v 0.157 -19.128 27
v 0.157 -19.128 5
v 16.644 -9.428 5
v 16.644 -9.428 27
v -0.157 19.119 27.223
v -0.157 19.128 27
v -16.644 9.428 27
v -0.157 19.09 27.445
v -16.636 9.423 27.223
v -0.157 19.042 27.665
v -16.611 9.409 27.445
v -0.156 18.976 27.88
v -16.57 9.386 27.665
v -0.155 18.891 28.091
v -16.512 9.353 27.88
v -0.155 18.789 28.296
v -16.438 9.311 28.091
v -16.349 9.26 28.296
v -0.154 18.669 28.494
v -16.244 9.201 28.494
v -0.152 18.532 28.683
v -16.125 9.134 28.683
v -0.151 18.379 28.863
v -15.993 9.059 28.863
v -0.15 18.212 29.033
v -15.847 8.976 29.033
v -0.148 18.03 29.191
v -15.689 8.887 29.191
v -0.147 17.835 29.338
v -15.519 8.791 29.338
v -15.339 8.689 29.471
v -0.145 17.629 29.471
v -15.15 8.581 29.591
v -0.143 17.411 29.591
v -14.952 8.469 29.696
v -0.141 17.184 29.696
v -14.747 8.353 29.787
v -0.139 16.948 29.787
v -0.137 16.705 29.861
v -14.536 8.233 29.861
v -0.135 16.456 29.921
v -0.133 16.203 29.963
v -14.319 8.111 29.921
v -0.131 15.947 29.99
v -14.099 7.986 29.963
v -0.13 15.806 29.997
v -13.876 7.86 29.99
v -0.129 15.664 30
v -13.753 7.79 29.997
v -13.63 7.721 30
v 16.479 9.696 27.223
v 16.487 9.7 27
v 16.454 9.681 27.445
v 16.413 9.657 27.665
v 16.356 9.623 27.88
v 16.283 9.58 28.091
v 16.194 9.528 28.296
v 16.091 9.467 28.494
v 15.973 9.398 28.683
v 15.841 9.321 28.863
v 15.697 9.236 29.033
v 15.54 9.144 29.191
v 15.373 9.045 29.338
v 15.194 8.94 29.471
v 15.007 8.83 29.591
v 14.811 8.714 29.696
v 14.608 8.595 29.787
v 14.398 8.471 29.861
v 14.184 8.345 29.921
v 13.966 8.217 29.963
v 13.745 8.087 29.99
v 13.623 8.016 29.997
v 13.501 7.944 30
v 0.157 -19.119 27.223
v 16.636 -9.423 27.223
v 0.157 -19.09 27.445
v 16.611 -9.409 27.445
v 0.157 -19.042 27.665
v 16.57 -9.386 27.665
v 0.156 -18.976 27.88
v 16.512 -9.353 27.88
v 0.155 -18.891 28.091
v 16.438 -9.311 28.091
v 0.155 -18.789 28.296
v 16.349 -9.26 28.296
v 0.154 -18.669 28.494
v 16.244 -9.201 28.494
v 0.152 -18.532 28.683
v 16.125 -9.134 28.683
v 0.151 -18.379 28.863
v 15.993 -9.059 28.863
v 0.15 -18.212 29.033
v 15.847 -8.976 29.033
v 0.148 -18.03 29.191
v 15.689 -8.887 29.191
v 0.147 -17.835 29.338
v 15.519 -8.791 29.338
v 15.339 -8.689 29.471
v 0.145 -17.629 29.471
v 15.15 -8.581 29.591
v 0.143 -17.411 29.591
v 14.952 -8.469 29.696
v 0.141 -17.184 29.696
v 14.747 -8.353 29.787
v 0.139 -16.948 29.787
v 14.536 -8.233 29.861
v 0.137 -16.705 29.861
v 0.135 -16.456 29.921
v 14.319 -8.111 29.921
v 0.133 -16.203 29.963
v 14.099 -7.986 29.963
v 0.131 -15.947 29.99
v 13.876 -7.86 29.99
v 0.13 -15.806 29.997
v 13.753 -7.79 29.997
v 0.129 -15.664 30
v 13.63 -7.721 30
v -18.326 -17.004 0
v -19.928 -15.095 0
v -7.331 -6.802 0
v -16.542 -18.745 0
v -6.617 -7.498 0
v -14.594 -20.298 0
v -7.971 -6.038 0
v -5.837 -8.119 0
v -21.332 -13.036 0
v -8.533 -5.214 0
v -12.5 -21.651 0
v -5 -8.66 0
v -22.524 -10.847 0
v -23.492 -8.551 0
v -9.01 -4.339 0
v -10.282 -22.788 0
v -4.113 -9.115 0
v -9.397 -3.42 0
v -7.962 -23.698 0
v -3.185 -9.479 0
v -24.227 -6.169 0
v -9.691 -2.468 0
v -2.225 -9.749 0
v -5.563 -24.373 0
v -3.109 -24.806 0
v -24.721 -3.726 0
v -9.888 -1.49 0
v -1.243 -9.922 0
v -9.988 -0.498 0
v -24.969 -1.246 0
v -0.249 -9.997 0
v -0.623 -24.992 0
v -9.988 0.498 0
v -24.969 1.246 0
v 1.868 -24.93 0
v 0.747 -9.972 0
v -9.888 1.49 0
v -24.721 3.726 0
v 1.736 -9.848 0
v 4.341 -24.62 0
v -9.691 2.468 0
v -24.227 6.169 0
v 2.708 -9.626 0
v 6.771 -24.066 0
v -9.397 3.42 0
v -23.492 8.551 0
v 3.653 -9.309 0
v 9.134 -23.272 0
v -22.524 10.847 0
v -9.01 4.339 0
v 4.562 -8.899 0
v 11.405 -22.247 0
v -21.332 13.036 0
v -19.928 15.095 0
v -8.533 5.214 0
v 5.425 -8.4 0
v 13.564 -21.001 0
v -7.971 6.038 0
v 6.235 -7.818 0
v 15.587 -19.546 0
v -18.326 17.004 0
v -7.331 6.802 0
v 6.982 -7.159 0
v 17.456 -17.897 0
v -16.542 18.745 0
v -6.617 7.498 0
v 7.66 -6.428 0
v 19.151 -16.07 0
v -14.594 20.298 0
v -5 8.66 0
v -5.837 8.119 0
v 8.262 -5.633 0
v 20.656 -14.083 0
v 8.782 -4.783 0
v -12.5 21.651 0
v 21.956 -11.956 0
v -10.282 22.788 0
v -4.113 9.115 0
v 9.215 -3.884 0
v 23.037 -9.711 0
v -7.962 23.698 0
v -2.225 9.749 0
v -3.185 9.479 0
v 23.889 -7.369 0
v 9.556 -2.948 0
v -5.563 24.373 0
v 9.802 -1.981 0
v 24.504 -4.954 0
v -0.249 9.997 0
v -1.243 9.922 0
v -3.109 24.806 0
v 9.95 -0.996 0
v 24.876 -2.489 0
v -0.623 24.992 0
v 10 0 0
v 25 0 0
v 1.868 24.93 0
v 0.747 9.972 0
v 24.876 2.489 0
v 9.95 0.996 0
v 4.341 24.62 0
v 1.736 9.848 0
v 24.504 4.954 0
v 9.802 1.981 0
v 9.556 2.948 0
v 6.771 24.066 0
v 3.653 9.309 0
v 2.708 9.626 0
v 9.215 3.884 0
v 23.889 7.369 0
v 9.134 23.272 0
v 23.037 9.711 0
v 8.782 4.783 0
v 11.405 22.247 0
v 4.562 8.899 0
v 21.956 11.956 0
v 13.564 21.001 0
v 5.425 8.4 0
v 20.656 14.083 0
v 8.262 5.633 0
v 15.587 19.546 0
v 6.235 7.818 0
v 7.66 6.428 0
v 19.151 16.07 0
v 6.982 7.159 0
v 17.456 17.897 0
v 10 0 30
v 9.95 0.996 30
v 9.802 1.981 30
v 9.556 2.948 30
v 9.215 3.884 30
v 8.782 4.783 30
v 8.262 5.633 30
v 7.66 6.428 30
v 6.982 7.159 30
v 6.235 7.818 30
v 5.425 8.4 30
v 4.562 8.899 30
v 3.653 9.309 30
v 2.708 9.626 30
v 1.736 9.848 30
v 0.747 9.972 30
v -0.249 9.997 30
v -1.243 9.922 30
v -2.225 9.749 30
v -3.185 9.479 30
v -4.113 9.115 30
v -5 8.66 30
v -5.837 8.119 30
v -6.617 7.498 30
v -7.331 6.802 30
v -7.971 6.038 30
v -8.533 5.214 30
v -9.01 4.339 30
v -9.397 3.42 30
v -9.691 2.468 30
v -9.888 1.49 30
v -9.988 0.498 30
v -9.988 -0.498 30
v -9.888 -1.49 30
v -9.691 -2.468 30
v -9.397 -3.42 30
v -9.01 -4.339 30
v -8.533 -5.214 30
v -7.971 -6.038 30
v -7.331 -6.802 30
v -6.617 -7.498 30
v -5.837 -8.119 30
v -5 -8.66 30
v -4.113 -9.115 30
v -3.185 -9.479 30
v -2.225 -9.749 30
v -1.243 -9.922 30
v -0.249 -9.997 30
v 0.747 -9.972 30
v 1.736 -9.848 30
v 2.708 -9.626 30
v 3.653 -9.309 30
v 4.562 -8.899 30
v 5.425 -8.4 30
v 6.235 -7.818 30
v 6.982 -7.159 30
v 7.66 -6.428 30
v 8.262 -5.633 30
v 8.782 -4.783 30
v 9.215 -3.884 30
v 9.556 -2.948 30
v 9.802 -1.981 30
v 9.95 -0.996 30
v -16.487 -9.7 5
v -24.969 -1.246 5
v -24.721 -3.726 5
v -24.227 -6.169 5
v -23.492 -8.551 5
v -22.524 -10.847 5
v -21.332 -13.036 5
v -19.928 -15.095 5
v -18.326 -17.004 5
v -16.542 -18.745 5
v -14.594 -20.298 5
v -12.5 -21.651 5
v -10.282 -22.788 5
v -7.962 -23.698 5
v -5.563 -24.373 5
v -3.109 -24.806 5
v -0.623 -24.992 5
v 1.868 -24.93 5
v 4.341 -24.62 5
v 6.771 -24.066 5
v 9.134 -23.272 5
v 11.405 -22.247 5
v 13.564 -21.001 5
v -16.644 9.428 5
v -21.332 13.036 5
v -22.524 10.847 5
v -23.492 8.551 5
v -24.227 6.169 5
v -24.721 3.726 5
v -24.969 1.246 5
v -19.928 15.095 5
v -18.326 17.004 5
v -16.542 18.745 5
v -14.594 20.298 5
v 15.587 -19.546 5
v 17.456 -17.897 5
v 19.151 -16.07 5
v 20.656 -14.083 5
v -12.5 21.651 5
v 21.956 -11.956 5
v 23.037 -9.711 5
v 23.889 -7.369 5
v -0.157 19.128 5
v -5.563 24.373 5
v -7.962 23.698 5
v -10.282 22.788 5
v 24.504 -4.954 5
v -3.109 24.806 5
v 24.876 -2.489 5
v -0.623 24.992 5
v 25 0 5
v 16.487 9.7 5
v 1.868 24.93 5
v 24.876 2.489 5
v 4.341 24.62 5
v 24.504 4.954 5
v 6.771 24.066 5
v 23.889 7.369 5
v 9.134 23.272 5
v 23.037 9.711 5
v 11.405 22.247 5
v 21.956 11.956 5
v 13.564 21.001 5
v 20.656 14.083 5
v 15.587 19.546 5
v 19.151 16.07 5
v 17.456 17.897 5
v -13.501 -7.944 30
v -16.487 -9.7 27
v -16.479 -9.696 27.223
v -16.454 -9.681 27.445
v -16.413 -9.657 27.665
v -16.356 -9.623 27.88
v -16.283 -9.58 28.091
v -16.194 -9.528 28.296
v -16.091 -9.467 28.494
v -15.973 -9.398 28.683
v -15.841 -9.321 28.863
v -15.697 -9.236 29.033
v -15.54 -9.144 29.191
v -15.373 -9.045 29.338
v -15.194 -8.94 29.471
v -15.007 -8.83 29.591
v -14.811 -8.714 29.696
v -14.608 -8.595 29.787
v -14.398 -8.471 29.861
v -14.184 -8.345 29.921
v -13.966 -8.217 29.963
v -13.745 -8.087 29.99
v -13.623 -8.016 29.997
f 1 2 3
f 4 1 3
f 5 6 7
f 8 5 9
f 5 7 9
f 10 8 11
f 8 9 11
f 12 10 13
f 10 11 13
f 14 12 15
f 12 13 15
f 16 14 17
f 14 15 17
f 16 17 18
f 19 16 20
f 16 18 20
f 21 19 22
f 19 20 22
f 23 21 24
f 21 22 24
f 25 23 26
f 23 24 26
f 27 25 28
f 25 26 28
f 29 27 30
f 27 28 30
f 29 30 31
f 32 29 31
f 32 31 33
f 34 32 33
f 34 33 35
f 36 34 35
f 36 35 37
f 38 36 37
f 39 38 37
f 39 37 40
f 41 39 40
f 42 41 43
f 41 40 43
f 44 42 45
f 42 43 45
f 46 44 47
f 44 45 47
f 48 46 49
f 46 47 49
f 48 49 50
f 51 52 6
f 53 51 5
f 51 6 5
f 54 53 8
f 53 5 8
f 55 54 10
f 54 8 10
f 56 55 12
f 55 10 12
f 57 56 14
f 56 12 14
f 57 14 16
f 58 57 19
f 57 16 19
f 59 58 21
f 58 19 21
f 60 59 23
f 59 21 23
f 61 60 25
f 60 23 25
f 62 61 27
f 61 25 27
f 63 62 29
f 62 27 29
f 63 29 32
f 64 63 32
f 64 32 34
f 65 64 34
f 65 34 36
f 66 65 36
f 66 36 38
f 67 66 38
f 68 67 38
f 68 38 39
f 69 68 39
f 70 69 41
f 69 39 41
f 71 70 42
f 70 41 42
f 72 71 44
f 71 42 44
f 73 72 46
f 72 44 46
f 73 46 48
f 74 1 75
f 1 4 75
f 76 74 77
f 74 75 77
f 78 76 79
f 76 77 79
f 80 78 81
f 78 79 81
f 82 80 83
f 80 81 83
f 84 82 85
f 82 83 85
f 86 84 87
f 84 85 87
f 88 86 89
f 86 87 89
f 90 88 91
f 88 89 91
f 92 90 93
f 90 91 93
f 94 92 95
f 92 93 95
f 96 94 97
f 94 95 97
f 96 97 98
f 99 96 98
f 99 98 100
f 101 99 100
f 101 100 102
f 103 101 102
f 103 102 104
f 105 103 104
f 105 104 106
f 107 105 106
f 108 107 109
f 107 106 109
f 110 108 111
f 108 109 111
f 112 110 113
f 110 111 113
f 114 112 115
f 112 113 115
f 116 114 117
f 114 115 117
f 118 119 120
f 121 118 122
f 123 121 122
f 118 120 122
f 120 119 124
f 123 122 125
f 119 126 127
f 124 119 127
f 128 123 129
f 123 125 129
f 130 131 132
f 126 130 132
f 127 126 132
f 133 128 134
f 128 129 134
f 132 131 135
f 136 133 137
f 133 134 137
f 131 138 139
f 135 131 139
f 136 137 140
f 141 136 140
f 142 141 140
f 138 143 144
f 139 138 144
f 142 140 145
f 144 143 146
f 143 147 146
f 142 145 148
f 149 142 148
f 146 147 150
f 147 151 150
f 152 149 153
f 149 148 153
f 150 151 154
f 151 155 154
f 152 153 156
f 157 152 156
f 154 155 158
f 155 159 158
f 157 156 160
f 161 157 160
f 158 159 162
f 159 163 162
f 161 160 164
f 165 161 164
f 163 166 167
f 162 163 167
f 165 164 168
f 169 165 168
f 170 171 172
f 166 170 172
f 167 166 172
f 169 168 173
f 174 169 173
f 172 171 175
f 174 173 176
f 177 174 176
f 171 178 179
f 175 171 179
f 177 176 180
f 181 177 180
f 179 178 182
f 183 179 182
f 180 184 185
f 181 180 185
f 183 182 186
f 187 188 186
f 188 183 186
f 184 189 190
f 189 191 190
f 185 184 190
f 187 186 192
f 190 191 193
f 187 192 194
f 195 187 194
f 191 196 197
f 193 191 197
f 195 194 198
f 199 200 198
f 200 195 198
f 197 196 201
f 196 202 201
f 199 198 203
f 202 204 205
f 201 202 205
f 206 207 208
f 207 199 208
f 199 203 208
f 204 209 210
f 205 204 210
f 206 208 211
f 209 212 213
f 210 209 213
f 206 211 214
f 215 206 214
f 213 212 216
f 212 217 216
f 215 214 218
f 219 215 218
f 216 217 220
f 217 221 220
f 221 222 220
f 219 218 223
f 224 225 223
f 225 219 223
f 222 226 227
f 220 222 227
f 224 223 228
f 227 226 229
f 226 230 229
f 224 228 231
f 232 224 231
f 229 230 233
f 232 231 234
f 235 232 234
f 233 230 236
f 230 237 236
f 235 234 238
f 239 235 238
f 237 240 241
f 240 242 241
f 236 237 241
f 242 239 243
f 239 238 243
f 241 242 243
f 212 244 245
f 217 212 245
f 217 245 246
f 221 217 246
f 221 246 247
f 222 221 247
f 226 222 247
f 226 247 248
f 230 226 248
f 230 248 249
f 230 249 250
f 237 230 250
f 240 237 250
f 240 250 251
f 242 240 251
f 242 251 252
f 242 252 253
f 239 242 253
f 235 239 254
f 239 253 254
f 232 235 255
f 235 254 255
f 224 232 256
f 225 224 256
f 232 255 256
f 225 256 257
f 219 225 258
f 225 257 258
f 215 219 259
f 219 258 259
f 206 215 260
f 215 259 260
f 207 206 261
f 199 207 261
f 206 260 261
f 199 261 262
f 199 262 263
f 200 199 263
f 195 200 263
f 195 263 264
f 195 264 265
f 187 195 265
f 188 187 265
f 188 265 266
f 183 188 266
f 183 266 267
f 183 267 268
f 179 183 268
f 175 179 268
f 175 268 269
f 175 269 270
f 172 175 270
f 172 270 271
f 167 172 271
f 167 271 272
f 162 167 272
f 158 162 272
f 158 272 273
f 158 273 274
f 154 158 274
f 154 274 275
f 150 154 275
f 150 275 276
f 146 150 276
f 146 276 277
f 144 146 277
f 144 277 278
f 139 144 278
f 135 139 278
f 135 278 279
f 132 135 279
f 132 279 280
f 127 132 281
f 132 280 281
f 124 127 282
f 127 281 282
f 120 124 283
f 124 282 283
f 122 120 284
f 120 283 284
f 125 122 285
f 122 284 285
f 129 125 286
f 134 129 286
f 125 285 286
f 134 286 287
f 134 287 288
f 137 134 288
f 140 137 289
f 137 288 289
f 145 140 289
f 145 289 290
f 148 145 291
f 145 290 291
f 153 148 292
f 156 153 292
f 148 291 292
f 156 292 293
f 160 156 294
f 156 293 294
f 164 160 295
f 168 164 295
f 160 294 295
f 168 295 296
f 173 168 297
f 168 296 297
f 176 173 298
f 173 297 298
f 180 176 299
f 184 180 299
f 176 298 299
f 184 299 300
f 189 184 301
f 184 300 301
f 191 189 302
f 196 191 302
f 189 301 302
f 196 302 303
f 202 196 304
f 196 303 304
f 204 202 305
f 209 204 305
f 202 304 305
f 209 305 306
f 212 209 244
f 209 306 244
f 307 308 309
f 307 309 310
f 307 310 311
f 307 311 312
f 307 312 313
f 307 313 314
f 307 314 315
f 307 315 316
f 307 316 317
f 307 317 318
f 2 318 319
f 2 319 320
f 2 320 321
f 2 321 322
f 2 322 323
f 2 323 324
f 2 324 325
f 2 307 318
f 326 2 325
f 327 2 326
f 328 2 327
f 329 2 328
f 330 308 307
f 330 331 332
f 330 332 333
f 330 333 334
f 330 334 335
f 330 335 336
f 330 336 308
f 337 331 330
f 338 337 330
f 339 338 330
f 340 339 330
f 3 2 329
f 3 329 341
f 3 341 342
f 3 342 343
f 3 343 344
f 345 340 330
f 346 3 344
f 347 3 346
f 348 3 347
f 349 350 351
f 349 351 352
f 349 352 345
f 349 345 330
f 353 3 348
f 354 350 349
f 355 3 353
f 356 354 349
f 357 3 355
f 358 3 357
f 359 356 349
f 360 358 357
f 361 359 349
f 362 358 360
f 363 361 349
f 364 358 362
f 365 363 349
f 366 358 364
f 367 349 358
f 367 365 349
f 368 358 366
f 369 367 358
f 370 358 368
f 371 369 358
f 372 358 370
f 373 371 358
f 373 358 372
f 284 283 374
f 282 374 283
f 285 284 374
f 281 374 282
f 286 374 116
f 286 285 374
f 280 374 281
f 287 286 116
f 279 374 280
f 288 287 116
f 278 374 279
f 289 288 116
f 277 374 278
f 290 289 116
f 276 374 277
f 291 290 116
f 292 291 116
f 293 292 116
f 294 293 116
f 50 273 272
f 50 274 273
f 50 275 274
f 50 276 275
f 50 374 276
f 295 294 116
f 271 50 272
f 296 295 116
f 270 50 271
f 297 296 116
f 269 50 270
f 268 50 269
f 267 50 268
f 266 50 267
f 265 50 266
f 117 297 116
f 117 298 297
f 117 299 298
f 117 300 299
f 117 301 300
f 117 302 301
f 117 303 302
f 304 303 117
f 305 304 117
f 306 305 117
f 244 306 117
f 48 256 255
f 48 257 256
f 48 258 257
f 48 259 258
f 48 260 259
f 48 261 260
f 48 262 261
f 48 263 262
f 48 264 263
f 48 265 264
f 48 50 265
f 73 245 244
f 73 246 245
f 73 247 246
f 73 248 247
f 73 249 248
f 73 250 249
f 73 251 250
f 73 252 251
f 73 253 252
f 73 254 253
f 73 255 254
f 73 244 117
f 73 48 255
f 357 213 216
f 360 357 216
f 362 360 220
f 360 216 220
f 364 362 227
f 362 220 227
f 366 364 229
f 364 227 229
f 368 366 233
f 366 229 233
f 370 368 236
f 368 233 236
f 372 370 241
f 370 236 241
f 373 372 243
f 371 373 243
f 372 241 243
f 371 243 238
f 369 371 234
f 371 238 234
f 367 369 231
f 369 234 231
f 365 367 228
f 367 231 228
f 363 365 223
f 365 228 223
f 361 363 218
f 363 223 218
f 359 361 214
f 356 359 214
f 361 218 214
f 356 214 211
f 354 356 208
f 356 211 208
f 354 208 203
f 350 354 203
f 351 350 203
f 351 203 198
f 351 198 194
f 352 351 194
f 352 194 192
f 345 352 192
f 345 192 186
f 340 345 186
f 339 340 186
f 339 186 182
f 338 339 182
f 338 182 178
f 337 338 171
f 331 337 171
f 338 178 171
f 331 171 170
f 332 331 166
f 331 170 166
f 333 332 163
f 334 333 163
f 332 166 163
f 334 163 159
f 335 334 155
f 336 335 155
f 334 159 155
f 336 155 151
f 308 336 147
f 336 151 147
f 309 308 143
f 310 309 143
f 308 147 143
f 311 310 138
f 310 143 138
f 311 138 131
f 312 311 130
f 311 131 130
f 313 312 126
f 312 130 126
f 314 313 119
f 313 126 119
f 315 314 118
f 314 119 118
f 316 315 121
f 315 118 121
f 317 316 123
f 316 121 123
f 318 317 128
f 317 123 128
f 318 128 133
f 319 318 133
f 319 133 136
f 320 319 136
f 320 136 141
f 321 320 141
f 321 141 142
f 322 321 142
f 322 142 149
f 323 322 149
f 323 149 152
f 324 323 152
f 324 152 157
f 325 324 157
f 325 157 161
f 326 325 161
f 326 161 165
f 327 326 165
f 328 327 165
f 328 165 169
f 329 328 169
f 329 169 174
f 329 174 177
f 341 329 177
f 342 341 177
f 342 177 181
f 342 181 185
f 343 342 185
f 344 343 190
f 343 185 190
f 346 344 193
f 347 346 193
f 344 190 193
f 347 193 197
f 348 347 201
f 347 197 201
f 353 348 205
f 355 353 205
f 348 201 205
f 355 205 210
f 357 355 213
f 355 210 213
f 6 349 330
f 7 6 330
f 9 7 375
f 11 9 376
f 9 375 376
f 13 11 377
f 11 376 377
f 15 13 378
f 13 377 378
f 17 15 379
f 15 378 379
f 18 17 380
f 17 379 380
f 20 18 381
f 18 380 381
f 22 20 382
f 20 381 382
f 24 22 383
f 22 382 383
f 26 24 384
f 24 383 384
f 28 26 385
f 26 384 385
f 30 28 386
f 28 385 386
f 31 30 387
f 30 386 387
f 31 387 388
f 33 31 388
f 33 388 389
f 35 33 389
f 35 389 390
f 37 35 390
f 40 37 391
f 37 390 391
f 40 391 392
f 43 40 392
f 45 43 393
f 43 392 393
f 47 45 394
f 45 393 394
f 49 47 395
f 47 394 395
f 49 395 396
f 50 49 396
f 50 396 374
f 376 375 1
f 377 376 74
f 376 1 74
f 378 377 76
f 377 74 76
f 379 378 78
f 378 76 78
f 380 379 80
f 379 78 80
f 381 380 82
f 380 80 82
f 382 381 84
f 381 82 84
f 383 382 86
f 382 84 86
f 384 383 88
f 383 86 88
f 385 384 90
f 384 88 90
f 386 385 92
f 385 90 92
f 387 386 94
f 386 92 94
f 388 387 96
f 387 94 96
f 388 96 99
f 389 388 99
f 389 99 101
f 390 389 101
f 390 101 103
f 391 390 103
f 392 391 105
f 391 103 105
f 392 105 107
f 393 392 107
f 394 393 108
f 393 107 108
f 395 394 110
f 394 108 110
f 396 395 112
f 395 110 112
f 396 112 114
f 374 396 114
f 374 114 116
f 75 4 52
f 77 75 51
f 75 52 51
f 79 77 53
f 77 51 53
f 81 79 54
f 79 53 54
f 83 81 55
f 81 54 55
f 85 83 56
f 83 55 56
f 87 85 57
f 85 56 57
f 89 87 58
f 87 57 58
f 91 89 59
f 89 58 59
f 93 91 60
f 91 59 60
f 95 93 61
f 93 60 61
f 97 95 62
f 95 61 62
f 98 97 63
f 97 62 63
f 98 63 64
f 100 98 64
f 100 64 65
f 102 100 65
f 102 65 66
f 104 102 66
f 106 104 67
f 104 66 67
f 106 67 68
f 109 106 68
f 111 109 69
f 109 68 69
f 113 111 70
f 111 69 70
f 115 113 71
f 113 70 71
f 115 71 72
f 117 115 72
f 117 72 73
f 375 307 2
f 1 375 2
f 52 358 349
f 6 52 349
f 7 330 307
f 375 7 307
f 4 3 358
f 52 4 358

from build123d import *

# Parameters (mm, degrees)
SKETCH2_R           = 25
BOSS_EXTRUDE1_DEPTH = 5
BOSS_EXTRUDE2_DEPTH = 25
FILLET6_R           = 3
SKETCH5_R           = 10
CUT_EXTRUDE1_DEPTH  = 31


with BuildPart() as part:
    # Sketch2 → Boss-Extrude1 (new body)
    with BuildSketch(Plane.XY):
        Circle(SKETCH2_R)
    extrude(amount=BOSS_EXTRUDE1_DEPTH)

    # Sketch3 → Boss-Extrude2 (add)
    with BuildSketch(Plane.XY.offset(5)):
        Polygon((16.644393052, -9.427942918), (16.487034598, 9.700495755), (-0.157358454, 19.128438672), (-16.644393052, 9.427942918), (-16.487034598, -9.700495755), (0.157358454, -19.128438672), align=None)
    extrude(amount=BOSS_EXTRUDE2_DEPTH)

    # Fillet6
    fillet6_edges = [part.edges().sort_by_distance(p)[0] for p in [
        (8.400875753, -14.278190795, 30),
        (16.565713825, 0.136276419, 30),
        (8.164838072, 14.414467214, 30),
        (-8.400875753, 14.278190795, 30),
        (-16.565713825, -0.136276419, 30),
        (-8.164838072, -14.414467214, 30),
    ]]
    fillet(fillet6_edges, radius=FILLET6_R)

    # Sketch5 → Cut-Extrude1 (cut, through all)
    with BuildSketch(Plane.XY.offset(30)):
        Circle(SKETCH5_R)
    extrude(amount=-CUT_EXTRUDE1_DEPTH, mode=Mode.SUBTRACT)


solid = part.part
